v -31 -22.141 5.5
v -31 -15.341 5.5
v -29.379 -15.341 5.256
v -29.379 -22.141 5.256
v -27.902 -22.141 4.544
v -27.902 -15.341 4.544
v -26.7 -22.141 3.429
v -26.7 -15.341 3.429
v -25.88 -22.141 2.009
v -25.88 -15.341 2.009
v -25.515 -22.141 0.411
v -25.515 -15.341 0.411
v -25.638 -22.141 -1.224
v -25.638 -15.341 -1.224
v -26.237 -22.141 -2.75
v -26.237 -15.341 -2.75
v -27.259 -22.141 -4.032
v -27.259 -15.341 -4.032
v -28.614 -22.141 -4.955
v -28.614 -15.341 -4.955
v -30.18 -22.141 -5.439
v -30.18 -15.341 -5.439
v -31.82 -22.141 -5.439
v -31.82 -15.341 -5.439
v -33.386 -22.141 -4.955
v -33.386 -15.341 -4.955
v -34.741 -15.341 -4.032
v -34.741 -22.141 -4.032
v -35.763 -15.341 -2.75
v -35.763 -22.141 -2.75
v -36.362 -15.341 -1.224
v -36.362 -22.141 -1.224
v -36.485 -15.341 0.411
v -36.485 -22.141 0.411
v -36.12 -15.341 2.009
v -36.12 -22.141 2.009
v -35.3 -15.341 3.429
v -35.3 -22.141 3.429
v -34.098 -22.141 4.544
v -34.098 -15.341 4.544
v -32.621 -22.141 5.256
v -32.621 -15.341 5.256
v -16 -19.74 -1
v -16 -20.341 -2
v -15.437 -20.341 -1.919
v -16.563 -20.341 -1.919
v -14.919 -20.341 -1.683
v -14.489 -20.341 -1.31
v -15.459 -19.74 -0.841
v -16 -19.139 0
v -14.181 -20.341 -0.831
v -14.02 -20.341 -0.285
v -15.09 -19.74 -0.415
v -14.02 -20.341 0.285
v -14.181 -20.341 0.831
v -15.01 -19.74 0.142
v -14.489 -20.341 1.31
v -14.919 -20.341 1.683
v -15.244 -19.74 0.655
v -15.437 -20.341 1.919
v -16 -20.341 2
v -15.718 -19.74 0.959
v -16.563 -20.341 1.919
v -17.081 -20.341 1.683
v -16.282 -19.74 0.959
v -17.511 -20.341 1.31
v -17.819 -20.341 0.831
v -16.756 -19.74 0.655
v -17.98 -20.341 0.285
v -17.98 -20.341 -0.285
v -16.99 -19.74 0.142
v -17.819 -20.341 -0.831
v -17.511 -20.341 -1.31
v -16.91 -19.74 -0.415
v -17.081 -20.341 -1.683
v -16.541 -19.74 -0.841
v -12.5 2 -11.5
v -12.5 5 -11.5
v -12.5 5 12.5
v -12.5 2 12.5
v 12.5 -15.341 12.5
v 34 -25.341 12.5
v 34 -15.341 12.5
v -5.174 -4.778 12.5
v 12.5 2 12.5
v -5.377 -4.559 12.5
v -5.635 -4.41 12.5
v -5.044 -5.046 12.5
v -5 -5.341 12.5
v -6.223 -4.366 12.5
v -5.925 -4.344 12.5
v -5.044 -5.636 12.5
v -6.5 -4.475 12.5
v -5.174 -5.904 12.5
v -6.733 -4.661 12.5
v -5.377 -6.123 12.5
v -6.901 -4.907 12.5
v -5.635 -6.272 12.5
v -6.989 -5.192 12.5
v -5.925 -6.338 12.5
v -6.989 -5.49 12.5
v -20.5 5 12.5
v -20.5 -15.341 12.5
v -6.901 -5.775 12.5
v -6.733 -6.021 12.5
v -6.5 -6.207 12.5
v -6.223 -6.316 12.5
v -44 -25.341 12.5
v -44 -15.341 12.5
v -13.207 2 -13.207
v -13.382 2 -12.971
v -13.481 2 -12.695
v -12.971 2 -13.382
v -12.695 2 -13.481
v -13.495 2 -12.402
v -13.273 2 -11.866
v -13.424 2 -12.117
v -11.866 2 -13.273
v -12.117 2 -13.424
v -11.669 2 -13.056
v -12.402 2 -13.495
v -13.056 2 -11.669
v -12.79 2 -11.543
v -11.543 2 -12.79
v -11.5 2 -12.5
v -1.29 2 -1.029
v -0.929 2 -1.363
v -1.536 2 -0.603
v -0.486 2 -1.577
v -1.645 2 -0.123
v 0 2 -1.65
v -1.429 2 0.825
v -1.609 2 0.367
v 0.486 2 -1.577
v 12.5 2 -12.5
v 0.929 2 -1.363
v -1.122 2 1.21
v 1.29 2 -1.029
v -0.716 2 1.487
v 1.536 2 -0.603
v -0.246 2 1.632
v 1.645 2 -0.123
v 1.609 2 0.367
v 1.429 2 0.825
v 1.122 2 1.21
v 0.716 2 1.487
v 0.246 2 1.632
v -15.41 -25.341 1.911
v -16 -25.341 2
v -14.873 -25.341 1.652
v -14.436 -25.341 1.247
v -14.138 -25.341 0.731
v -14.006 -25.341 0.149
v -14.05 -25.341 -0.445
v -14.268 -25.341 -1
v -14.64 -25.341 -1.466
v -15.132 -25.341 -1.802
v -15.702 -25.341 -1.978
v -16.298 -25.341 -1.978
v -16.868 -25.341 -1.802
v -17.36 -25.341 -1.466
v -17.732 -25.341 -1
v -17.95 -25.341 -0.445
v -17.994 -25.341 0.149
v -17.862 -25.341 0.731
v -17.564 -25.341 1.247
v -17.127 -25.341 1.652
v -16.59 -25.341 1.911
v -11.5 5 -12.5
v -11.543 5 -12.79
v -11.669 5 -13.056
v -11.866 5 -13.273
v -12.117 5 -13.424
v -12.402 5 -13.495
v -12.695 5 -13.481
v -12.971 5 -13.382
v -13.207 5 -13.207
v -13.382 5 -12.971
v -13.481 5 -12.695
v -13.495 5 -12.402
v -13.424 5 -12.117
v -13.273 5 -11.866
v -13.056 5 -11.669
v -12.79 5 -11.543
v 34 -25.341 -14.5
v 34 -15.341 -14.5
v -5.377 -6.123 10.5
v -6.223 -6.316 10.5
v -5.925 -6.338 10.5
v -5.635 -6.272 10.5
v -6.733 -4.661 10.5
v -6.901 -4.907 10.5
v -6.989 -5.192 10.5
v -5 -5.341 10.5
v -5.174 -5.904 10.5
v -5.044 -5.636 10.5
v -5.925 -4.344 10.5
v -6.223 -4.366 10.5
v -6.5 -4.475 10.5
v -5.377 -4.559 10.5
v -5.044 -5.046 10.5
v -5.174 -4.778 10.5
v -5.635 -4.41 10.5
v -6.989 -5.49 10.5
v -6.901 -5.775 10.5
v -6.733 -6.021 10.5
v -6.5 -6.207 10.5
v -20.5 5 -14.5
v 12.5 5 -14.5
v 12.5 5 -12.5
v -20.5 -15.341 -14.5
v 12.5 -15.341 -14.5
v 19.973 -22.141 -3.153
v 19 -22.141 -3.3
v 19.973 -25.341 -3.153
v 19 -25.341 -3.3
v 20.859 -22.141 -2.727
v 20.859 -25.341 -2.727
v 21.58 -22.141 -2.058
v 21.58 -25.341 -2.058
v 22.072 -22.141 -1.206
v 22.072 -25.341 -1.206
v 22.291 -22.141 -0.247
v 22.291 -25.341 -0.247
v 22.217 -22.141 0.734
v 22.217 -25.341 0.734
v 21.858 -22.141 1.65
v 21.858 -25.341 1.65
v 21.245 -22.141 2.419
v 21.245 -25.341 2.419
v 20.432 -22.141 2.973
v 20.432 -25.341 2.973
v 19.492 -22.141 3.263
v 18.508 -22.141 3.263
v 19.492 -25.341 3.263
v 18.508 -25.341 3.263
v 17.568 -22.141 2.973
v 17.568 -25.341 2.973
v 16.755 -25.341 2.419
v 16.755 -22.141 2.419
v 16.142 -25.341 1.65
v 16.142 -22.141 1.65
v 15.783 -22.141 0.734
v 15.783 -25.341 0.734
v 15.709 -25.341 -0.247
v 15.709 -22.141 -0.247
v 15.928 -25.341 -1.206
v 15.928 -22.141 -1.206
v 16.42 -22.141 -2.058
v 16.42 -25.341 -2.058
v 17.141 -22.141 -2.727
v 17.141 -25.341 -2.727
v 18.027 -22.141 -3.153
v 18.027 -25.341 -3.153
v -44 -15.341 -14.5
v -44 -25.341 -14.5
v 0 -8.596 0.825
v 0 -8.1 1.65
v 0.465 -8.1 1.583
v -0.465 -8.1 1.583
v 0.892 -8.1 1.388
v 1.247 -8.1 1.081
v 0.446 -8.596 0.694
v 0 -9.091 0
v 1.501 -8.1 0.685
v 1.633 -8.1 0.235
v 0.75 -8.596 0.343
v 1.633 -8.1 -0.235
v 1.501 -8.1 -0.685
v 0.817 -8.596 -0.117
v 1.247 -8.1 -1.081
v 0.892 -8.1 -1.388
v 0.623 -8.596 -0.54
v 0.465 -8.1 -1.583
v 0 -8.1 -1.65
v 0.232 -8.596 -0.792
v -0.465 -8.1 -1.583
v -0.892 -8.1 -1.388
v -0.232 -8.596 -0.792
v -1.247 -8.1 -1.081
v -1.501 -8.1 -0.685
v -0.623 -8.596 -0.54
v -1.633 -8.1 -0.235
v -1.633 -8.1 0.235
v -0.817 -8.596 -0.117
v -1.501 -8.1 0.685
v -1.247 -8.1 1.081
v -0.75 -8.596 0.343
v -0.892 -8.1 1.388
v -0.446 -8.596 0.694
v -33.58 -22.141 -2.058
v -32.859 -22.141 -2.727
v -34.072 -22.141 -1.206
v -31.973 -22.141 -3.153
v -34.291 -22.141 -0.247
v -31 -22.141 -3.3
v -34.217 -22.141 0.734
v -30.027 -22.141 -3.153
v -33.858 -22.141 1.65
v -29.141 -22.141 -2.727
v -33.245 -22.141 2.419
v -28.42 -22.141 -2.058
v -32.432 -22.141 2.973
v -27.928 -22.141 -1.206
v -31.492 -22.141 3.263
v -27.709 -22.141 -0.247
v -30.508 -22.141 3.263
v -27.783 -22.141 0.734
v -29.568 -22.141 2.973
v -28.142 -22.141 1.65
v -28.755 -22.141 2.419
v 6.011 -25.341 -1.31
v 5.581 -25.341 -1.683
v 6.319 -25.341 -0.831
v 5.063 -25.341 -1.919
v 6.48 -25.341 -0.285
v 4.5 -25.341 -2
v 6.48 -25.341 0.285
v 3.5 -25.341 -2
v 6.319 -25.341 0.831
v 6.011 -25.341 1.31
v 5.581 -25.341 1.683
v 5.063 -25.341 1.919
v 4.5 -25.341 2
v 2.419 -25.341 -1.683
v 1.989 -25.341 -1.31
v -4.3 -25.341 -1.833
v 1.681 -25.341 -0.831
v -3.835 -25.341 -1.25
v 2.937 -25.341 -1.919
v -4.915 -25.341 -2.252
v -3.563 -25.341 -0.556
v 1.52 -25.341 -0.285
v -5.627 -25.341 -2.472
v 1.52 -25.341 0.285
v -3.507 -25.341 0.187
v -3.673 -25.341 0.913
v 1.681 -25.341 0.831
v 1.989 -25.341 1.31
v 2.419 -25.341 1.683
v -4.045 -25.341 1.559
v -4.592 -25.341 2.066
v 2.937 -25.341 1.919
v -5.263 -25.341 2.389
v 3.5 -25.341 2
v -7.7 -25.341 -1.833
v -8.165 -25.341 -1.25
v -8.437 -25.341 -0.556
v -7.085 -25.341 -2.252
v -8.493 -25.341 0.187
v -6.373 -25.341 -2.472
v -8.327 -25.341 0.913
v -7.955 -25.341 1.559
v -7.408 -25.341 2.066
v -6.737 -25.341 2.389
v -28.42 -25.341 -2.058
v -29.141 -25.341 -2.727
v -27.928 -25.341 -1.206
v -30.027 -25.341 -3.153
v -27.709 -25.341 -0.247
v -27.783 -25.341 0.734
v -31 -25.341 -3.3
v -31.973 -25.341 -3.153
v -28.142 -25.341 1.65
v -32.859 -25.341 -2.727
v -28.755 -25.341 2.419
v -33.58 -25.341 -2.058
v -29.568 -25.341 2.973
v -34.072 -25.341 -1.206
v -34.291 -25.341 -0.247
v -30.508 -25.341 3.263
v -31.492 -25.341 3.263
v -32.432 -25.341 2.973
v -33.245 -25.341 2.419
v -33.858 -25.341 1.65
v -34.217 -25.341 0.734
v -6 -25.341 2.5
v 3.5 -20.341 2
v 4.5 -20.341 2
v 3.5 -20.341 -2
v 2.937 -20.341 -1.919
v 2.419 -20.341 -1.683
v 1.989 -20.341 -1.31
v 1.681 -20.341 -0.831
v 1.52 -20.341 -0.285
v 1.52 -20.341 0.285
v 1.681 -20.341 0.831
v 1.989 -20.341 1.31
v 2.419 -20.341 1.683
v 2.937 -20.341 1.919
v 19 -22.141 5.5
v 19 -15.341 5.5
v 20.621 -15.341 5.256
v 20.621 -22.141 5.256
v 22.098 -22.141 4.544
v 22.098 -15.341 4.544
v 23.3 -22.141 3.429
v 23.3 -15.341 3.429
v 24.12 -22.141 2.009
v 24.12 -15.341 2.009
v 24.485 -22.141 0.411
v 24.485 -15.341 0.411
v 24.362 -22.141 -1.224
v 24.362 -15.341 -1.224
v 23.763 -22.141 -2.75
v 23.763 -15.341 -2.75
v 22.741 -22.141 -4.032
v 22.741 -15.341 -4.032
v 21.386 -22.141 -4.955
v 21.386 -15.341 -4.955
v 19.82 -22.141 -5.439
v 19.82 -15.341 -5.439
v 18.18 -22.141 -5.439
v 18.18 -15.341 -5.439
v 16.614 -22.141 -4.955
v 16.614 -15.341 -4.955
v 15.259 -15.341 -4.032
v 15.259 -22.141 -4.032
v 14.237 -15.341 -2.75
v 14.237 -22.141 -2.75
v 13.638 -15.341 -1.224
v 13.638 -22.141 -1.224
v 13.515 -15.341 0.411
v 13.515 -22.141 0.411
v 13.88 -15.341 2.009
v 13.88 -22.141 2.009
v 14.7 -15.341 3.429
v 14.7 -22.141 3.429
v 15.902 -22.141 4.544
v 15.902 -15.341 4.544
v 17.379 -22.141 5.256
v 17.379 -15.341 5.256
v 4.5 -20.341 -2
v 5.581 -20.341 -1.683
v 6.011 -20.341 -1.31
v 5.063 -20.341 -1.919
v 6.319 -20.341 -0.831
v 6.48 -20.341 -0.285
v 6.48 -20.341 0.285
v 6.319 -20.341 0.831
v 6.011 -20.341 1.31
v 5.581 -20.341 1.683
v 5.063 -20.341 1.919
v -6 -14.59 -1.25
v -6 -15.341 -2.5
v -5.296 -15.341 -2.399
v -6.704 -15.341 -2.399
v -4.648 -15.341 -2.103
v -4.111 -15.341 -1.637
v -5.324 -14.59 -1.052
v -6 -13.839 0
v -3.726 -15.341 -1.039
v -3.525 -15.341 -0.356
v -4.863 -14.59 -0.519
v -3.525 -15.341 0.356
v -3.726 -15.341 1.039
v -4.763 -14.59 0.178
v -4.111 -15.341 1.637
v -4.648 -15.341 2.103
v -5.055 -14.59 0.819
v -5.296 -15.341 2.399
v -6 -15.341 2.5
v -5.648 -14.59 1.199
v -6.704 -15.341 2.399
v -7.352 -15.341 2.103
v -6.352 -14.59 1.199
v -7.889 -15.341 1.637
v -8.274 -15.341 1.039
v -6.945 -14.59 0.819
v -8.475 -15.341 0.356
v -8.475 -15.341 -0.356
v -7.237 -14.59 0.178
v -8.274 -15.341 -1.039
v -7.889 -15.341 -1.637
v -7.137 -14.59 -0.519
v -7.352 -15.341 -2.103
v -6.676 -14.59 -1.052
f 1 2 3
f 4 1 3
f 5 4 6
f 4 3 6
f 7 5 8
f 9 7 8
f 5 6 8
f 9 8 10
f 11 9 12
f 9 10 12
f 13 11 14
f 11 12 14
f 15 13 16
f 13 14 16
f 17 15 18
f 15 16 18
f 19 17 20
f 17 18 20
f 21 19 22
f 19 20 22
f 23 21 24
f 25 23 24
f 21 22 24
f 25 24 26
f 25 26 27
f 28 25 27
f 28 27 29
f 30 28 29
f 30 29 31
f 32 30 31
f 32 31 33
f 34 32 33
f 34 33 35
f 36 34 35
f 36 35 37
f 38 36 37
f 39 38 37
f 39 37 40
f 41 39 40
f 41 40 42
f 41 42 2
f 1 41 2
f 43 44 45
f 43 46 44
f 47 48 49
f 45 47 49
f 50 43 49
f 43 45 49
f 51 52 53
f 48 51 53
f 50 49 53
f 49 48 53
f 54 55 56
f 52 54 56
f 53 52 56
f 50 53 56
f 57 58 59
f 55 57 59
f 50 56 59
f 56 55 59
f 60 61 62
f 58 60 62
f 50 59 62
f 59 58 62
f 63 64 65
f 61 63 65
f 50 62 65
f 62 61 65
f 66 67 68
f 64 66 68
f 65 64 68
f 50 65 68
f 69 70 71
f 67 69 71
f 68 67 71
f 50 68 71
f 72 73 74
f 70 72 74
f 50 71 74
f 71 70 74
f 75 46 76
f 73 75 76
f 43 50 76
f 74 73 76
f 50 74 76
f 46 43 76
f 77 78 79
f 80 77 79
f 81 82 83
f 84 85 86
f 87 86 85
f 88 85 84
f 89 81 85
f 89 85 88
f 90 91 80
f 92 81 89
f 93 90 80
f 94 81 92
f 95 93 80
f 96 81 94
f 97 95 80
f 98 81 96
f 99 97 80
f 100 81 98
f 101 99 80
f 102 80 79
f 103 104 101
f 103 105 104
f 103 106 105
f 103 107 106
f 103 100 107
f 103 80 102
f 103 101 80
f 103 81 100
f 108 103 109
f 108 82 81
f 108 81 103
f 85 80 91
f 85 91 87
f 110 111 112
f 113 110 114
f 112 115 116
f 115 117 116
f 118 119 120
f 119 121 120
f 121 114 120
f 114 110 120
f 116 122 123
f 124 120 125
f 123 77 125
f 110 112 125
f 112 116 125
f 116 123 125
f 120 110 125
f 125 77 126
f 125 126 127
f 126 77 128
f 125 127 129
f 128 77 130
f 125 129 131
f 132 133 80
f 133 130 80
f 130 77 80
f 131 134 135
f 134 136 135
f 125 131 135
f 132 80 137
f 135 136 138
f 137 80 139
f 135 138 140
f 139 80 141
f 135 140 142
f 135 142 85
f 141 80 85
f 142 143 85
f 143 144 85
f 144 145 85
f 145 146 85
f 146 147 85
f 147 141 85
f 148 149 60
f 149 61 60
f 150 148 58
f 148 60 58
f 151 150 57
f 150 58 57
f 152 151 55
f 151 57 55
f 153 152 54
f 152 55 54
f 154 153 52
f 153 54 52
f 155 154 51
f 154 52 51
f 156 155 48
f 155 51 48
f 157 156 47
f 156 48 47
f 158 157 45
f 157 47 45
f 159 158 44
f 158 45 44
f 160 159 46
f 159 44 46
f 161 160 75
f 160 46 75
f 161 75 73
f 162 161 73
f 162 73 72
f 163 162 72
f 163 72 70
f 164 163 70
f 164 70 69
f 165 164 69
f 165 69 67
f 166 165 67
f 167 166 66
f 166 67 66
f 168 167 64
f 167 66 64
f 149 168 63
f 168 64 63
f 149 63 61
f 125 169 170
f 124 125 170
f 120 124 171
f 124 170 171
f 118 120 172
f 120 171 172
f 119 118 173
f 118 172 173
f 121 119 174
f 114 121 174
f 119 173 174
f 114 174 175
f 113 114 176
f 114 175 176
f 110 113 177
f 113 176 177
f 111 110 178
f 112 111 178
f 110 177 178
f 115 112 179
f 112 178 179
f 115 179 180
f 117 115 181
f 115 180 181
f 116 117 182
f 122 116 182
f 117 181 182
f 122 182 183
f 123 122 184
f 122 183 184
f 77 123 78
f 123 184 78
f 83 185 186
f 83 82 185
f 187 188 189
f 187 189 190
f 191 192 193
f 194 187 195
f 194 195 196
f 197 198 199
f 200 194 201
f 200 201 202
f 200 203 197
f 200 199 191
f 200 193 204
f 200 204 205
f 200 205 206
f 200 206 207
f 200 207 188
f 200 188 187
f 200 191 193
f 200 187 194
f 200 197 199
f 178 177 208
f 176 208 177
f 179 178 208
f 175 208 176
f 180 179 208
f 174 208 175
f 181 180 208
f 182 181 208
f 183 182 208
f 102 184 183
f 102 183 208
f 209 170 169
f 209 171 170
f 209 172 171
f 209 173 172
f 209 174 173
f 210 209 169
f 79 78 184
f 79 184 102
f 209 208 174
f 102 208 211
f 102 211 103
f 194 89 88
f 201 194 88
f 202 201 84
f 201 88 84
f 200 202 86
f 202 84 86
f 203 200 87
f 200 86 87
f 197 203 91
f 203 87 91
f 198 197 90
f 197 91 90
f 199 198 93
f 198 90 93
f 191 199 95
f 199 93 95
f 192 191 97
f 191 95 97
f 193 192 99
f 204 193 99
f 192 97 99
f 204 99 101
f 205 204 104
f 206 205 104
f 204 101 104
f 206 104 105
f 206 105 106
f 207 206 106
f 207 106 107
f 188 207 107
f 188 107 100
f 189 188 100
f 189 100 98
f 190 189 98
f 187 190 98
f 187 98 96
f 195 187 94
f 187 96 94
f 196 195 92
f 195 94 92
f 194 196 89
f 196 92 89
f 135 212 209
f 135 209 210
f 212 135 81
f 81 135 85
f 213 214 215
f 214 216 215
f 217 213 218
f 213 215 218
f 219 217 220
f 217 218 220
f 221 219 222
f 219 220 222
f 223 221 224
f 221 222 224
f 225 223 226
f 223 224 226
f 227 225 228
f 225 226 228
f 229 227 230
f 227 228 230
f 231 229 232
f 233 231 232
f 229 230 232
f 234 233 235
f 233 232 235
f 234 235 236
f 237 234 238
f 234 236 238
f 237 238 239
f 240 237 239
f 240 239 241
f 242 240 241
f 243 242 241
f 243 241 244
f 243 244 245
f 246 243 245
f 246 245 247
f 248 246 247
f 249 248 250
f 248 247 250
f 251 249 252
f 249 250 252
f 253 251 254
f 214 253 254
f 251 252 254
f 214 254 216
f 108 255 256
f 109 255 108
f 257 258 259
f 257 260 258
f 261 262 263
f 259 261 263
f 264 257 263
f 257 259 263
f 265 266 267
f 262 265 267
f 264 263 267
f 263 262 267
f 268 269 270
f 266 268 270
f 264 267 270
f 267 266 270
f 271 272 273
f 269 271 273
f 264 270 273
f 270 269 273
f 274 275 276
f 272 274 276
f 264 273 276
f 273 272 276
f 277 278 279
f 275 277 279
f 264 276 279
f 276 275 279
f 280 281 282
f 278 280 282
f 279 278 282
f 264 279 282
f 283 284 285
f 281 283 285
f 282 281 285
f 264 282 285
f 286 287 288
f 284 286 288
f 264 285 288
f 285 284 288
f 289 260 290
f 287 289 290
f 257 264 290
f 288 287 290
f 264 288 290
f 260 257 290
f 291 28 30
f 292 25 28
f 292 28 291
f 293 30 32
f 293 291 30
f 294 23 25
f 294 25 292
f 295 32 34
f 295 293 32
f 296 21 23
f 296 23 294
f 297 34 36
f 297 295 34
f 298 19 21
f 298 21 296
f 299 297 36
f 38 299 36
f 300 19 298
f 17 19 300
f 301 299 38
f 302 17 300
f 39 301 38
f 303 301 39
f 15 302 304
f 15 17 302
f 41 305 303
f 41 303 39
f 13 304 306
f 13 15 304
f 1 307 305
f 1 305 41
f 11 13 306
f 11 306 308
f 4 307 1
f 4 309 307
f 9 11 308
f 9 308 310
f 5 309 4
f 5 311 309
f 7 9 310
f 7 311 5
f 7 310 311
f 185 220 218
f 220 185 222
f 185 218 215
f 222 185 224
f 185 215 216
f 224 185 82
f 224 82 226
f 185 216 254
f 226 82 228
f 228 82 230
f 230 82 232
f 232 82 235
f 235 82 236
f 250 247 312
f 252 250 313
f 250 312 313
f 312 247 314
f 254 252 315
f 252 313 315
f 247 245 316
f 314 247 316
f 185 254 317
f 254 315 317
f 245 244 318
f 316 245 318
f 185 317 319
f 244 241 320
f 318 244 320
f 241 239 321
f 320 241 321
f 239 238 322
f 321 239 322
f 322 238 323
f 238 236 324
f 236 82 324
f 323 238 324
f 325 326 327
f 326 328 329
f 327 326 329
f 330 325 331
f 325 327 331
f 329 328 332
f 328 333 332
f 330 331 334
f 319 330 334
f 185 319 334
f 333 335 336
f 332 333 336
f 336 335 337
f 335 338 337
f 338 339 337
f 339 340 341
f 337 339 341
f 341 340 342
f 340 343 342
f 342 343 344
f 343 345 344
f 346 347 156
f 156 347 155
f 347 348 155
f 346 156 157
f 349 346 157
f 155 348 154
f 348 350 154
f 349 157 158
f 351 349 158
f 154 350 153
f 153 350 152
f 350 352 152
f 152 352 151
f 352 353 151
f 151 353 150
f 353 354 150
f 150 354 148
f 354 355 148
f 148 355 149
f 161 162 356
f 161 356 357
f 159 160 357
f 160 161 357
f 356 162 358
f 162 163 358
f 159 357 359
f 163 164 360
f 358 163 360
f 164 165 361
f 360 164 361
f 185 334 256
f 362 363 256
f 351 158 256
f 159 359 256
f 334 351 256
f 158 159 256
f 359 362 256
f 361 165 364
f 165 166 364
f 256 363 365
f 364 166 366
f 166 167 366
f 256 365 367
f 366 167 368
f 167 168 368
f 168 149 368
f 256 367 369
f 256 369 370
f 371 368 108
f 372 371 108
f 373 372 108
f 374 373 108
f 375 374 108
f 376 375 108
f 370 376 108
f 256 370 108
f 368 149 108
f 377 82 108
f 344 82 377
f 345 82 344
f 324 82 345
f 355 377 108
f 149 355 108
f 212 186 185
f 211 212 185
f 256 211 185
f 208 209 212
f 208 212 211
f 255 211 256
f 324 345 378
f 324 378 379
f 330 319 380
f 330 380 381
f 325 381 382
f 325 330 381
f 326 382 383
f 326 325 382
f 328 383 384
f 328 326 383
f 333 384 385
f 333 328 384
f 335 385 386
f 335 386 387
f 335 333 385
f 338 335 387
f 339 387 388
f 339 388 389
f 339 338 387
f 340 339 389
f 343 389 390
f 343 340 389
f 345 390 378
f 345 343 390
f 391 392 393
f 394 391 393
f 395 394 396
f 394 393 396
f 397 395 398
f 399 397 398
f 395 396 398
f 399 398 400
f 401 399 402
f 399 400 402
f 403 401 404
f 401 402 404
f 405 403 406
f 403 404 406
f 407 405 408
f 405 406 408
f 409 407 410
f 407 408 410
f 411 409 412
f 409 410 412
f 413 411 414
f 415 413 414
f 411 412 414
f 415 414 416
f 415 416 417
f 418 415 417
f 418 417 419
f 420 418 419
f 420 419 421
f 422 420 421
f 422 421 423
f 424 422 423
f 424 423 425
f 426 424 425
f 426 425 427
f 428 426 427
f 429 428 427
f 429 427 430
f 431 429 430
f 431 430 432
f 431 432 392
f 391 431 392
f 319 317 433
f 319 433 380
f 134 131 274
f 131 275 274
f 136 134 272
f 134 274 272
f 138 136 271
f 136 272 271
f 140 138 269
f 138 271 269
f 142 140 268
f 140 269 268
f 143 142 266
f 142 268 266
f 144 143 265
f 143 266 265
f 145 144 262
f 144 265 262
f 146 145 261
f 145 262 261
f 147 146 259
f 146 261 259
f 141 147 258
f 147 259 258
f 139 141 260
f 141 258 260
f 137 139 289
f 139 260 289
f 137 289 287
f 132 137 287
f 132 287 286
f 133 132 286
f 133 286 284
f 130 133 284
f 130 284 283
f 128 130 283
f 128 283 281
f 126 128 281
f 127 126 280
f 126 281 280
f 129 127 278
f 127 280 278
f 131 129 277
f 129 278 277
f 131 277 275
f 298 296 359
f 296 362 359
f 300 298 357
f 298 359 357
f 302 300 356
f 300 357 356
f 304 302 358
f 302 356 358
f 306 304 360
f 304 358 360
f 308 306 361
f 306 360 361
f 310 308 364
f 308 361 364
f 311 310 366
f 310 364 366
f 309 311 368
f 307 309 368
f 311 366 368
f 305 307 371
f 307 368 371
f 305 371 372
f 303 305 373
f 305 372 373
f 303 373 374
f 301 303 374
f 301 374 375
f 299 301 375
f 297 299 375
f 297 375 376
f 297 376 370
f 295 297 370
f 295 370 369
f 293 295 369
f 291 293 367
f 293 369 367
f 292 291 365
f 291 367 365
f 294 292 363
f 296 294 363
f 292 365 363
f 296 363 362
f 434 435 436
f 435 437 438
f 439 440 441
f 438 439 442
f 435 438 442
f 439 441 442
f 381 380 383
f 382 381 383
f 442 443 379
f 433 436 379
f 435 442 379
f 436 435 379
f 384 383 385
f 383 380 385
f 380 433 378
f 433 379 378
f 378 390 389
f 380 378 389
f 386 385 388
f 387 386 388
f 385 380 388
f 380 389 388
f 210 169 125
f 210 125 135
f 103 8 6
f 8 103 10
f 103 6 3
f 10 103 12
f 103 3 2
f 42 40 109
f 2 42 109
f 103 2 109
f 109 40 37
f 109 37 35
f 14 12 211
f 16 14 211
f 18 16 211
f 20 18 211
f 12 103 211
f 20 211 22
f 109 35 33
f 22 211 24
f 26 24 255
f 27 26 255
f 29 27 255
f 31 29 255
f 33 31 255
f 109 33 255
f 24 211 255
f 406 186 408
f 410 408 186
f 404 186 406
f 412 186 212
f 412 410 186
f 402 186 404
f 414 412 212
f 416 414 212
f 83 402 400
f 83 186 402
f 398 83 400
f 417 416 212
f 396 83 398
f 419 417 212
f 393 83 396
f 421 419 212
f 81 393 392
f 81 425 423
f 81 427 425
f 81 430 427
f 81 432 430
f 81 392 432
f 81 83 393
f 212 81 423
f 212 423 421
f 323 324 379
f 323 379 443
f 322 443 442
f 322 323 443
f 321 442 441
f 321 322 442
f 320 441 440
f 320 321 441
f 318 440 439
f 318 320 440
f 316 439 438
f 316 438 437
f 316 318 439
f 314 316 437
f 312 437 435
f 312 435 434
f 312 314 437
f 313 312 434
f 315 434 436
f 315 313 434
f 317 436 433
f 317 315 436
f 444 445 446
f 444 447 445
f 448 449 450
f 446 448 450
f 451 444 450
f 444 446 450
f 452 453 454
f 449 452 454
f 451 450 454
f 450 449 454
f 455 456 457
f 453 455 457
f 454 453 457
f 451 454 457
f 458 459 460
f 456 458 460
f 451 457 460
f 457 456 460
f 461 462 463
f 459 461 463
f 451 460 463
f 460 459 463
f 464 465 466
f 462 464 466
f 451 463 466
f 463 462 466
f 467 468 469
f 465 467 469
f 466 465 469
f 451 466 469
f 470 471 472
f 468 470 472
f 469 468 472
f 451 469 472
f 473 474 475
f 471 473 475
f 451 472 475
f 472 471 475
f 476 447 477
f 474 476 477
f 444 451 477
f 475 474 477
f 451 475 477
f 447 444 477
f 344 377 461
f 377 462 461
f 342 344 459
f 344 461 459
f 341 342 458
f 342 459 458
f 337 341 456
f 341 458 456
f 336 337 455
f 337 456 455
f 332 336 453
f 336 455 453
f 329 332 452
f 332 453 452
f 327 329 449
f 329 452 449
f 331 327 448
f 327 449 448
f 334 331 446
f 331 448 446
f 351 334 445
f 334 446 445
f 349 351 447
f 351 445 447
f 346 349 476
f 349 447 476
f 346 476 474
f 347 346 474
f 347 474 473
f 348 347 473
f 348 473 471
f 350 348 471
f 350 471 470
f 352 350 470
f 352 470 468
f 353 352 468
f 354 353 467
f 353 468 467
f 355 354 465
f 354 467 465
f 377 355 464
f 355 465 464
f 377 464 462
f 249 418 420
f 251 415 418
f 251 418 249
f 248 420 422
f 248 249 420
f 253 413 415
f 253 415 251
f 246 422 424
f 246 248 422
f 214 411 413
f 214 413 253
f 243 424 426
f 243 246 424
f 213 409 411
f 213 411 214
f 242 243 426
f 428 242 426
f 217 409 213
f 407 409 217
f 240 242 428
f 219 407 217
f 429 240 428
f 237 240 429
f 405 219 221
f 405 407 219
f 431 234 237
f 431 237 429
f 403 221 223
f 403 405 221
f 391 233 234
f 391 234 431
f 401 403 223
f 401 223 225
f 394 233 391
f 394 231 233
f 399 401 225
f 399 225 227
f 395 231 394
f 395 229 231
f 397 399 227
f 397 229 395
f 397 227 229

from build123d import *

# Parameters (mm, degrees)
SKETCH_1_W                = 29
SKETCH_1_H                = 29
EXTRUDE_1_DEPTH           = 5
SKETCH_2_W                = 25
SKETCH_2_H                = 25
CUT_EXTRUDE_1_DEPTH       = 3
SKETCH_3_W                = 35
SKETCH_3_H                = 29
EXTRUDE_748_DEPTH         = 25.341167732
HOLE_WIZARD_M4_1_D        = 3.3
HOLE_WIZARD_M4_1_DEPTH    = 10.1
HOLE_WIZARD_M4_1_TIP      = 0.991420021
SKETCH_9_R                = 1
CUT_EXTRUDE_2_DEPTH       = 3
SKETCH_11_W               = 29
SKETCH_11_H               = 5
EXTRUDE_4_DEPTH           = 6
CUT_EXTRUDE_8_DEPTH       = 40.383835
SKETCH_19_W               = 80
SKETCH_19_H               = 25
EXTRUDE_5_DEPTH           = 10
HOLE_WIZARD_1_D           = 6.6
HOLE_WIZARD_1_DEPTH       = 10.1
HOLE_WIZARD_1_CBORE_D     = 11
HOLE_WIZARD_1_CBORE_DEPTH = 6.8
HOLE_WIZARD_1_TIP         = 1.982840043
SKETCH_23_W               = 80
SKETCH_23_H               = 10
EXTRUDE_6_DEPTH           = 2
SKETCH_24_W               = 27
SKETCH_24_H               = 10
CUT_EXTRUDE_9_DEPTH       = 2
MM_1_D                    = 4
MM_1_DEPTH                = 5
MM_1_TIP                  = 1.201721238
CUT_EXTRUDE_10_DEPTH      = 5
SKETCH_28_R               = 1
CUT_EXTRUDE_11_DEPTH      = 2
HOLE_WIZARD_M6_1_D        = 5
HOLE_WIZARD_M6_1_DEPTH    = 10
HOLE_WIZARD_M6_1_TIP      = 1.502151548


with BuildPart() as part:
    # 草图1 → 凸台-拉伸1 (new body)
    with BuildSketch(Plane(origin=(0, 0, 0), x_dir=(1, 0, 0), z_dir=(0, 1, 0))):
        Rectangle(SKETCH_1_W, SKETCH_1_H)
    extrude(amount=EXTRUDE_1_DEPTH)

    # 草图2 → 切除-拉伸1 (cut)
    with BuildSketch(Plane.XZ.offset(-5)):
        Rectangle(SKETCH_2_W, SKETCH_2_H)
    extrude(amount=CUT_EXTRUDE_1_DEPTH, mode=Mode.SUBTRACT)

    # 草图3 → Extrude 748 (add)
    with BuildSketch(Plane(origin=(0, 0, 0), x_dir=(-1, 0, 0), z_dir=(0, -1, 0))):
        with Locations((3, 0)):
            Rectangle(SKETCH_3_W, SKETCH_3_H)
    extrude(amount=EXTRUDE_748_DEPTH)

    # M4 螺纹孔1
    with Locations(Plane.ZX.offset(2)):
        with Locations((0, 0)):
            Hole(HOLE_WIZARD_M4_1_D / 2, depth=HOLE_WIZARD_M4_1_DEPTH)
            with Locations((0, 0, -(HOLE_WIZARD_M4_1_DEPTH + HOLE_WIZARD_M4_1_TIP / 2))):  # 118° drill point
                Cone(0, HOLE_WIZARD_M4_1_D / 2, HOLE_WIZARD_M4_1_TIP, mode=Mode.SUBTRACT)

    # 草图9 → 切除-拉伸2 (cut)
    with BuildSketch(Plane(origin=(0, 5, 0), x_dir=(1, 0, 0), z_dir=(0, 1, 0))):
        with Locations((-12.5, 12.5)):
            Circle(SKETCH_9_R)
    extrude(amount=-CUT_EXTRUDE_2_DEPTH, mode=Mode.SUBTRACT)

    # 草图11 → 凸台-拉伸4 (add)
    with BuildSketch(Plane.ZY.offset(14.5)):
        with Locations((0, 2.5)):
            Rectangle(SKETCH_11_W, SKETCH_11_H)
    extrude(amount=EXTRUDE_4_DEPTH)

    # 草图17 → 切除-拉伸8 (cut, through all)
    with BuildSketch(Plane(origin=(0, 5, 0), x_dir=(1, 0, 0), z_dir=(0, 1, 0))):
        Polygon((-20.5, -14.5), (14.5, -14.5), (14.5, 14.5), (12.5, 14.5), (12.5, -12.5), (-20.5, -12.5), align=None)
    extrude(amount=-CUT_EXTRUDE_8_DEPTH, mode=Mode.SUBTRACT)

    # 草图19 → 凸台-拉伸5 (add)
    with BuildSketch(Plane(origin=(0, -25.341167732, 0), x_dir=(-1, 0, 0), z_dir=(0, -1, 0))):
        with Locations((6, 0)):
            Rectangle(SKETCH_19_W, SKETCH_19_H)
    extrude(amount=-EXTRUDE_5_DEPTH)

    # 打孔尺寸(%根据)内六角圆柱头螺钉的类型1
    with Locations(Plane(origin=(-31, -15.341167732, 0), x_dir=(0, 0, 1), z_dir=(0, 1, 0))):
        with Locations((0, 0), (0, 50)):
            CounterBoreHole(HOLE_WIZARD_1_D / 2, HOLE_WIZARD_1_CBORE_D / 2, HOLE_WIZARD_1_CBORE_DEPTH, depth=HOLE_WIZARD_1_DEPTH)
            with Locations((0, 0, -(HOLE_WIZARD_1_DEPTH + HOLE_WIZARD_1_TIP / 2))):  # 118° drill point
                Cone(0, HOLE_WIZARD_1_D / 2, HOLE_WIZARD_1_TIP, mode=Mode.SUBTRACT)

    # 草图23 → 凸台-拉伸6 (add)
    with BuildSketch(Plane(origin=(0, 0, -12.5), x_dir=(-1, 0, 0), z_dir=(0, 0, -1))):
        with Locations((6, -20.341167732)):
            Rectangle(SKETCH_23_W, SKETCH_23_H)
    extrude(amount=EXTRUDE_6_DEPTH)

    # 草图24 → 切除-拉伸9 (cut)
    with BuildSketch(Plane.ZY.offset(46)):
        with Locations((-1, -20.341167732)):
            Rectangle(SKETCH_24_W, SKETCH_24_H)
    extrude(amount=-CUT_EXTRUDE_9_DEPTH, mode=Mode.SUBTRACT)

    # 大小mm 暗销孔1
    with Locations(Plane(origin=(-16, -25.341167732, 0), x_dir=(0, 0, -1), z_dir=(0, -1, 0))):
        with Locations((0, 0)):
            Hole(MM_1_D / 2, depth=MM_1_DEPTH)
            with Locations((0, 0, -(MM_1_DEPTH + MM_1_TIP / 2))):  # 118° drill point
                Cone(0, MM_1_D / 2, MM_1_TIP, mode=Mode.SUBTRACT)

    # 草图27 → 切除-拉伸10 (cut)
    with BuildSketch(Plane.XZ.offset(25.341167732)):
        with BuildLine():
            Line((3.5, 2), (4.5, 2))
            ThreePointArc((4.5, 2), (6.5, 0), (4.5, -2))
            Line((4.5, -2), (3.5, -2))
            ThreePointArc((3.5, -2), (1.5, 0), (3.5, 2))
        make_face()
    extrude(amount=-CUT_EXTRUDE_10_DEPTH, mode=Mode.SUBTRACT)

    # 草图28 → 切除-拉伸11 (cut)
    with BuildSketch(Plane.XY.offset(12.5)):
        with Locations((-6, -5.341167732)):
            Circle(SKETCH_28_R)
    extrude(amount=-CUT_EXTRUDE_11_DEPTH, mode=Mode.SUBTRACT)

    # M6 螺纹孔1
    with Locations(Plane(origin=(-6, -25.341167732, 0), x_dir=(0, 0, -1), z_dir=(0, -1, 0))):
        with Locations((0, 0)):
            Hole(HOLE_WIZARD_M6_1_D / 2, depth=HOLE_WIZARD_M6_1_DEPTH)
            with Locations((0, 0, -(HOLE_WIZARD_M6_1_DEPTH + HOLE_WIZARD_M6_1_TIP / 2))):  # 118° drill point
                Cone(0, HOLE_WIZARD_M6_1_D / 2, HOLE_WIZARD_M6_1_TIP, mode=Mode.SUBTRACT)


solid = part.part
